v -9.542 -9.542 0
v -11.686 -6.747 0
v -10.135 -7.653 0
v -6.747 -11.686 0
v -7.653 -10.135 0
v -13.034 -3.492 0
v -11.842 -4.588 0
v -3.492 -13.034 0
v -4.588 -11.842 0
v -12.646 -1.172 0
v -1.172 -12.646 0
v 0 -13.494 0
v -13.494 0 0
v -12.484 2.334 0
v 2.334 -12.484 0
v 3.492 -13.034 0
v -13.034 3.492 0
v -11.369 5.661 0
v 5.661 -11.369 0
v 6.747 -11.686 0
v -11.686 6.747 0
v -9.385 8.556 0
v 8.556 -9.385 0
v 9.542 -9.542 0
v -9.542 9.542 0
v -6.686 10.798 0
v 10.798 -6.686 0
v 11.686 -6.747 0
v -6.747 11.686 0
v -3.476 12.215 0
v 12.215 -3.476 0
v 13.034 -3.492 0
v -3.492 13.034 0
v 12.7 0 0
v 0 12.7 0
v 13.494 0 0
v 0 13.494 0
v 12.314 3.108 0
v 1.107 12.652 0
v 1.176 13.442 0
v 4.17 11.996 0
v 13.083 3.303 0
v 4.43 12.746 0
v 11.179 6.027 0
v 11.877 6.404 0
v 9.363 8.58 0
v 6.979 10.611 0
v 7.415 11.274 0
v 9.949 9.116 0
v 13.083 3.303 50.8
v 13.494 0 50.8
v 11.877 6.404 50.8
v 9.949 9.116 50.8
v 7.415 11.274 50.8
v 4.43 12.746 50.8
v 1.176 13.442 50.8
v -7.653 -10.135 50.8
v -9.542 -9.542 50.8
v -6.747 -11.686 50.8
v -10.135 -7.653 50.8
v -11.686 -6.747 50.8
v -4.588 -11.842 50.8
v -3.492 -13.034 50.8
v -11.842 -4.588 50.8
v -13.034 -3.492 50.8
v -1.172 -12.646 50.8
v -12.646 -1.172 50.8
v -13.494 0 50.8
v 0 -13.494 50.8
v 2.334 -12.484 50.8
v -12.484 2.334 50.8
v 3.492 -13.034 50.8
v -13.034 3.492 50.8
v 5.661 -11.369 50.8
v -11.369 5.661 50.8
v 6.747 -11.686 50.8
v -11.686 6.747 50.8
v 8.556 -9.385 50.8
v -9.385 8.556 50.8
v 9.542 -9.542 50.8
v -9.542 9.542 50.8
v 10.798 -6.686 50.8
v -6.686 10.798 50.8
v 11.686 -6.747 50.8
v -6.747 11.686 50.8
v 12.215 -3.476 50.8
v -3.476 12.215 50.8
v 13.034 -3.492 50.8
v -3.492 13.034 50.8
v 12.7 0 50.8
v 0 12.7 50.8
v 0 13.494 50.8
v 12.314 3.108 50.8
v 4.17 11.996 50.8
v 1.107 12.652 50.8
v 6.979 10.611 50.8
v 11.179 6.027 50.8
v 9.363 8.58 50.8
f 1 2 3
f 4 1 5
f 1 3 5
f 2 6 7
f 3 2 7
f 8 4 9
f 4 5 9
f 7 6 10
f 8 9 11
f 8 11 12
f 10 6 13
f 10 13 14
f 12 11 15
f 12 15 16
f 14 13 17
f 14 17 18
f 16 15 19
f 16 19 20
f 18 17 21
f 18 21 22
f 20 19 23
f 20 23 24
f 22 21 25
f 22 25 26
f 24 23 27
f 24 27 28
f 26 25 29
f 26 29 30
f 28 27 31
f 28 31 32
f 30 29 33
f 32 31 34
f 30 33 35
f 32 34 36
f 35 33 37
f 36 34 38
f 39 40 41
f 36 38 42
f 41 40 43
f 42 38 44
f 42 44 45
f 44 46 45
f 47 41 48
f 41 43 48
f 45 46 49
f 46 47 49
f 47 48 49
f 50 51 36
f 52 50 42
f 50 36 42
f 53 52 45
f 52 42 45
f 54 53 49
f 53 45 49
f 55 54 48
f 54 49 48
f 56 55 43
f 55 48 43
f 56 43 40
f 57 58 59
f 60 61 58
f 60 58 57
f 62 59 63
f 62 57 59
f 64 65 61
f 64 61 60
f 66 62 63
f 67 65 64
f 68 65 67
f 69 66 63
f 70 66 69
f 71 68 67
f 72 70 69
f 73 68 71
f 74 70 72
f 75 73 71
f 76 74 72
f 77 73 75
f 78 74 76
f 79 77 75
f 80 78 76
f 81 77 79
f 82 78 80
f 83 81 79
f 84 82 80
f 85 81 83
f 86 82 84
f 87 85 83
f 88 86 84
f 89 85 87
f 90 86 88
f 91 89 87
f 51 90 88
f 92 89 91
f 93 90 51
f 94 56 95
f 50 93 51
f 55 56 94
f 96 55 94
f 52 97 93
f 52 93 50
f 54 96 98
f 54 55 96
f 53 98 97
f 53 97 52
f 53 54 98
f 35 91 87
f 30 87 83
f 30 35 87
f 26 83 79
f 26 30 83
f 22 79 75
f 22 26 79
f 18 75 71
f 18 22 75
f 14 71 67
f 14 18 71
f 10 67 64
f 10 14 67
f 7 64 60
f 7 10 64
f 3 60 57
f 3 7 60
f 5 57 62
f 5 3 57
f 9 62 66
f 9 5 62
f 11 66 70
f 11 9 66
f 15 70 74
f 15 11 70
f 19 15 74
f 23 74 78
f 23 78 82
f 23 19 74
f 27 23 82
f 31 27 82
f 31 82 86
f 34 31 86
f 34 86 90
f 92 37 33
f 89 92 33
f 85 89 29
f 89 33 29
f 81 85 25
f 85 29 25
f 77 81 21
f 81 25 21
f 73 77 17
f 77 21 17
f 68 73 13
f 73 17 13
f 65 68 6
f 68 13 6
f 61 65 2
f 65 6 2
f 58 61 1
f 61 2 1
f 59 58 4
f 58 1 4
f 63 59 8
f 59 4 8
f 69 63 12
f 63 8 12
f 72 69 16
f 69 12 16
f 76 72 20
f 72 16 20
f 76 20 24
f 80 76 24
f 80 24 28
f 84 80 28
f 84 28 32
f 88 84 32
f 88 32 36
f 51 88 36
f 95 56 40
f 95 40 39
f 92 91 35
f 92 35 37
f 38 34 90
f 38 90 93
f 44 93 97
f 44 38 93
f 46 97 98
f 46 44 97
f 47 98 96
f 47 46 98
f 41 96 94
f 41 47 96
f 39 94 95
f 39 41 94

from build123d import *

# Parameters (mm, degrees)
SKETCH1_R           = 13.49375
SKETCH1_R_2         = 12.7
BOSS_EXTRUDE1_DEPTH = 50.8
CUT_EXTRUDE1_DEPTH  = 55.266035217


with BuildPart() as part:
    # Sketch1 → Boss-Extrude1 (new body)
    with BuildSketch(Plane.XY):
        Circle(SKETCH1_R)
        Circle(SKETCH1_R_2, mode=Mode.SUBTRACT)
    extrude(amount=BOSS_EXTRUDE1_DEPTH)

    # Sketch2 → Cut-Extrude1 (cut, through all)
    with BuildSketch(Plane.XY.offset(50.8)):
        with BuildLine():
            Line((0, 0), (0, 13.49375))
            ThreePointArc((0, 13.49375), (0.588589108, 13.48090694), (1.176057804, 13.442402207))
            Line((1.176057804, 13.442402207), (0, 0))
        make_face()
    extrude(amount=-CUT_EXTRUDE1_DEPTH, mode=Mode.SUBTRACT)


solid = part.part
